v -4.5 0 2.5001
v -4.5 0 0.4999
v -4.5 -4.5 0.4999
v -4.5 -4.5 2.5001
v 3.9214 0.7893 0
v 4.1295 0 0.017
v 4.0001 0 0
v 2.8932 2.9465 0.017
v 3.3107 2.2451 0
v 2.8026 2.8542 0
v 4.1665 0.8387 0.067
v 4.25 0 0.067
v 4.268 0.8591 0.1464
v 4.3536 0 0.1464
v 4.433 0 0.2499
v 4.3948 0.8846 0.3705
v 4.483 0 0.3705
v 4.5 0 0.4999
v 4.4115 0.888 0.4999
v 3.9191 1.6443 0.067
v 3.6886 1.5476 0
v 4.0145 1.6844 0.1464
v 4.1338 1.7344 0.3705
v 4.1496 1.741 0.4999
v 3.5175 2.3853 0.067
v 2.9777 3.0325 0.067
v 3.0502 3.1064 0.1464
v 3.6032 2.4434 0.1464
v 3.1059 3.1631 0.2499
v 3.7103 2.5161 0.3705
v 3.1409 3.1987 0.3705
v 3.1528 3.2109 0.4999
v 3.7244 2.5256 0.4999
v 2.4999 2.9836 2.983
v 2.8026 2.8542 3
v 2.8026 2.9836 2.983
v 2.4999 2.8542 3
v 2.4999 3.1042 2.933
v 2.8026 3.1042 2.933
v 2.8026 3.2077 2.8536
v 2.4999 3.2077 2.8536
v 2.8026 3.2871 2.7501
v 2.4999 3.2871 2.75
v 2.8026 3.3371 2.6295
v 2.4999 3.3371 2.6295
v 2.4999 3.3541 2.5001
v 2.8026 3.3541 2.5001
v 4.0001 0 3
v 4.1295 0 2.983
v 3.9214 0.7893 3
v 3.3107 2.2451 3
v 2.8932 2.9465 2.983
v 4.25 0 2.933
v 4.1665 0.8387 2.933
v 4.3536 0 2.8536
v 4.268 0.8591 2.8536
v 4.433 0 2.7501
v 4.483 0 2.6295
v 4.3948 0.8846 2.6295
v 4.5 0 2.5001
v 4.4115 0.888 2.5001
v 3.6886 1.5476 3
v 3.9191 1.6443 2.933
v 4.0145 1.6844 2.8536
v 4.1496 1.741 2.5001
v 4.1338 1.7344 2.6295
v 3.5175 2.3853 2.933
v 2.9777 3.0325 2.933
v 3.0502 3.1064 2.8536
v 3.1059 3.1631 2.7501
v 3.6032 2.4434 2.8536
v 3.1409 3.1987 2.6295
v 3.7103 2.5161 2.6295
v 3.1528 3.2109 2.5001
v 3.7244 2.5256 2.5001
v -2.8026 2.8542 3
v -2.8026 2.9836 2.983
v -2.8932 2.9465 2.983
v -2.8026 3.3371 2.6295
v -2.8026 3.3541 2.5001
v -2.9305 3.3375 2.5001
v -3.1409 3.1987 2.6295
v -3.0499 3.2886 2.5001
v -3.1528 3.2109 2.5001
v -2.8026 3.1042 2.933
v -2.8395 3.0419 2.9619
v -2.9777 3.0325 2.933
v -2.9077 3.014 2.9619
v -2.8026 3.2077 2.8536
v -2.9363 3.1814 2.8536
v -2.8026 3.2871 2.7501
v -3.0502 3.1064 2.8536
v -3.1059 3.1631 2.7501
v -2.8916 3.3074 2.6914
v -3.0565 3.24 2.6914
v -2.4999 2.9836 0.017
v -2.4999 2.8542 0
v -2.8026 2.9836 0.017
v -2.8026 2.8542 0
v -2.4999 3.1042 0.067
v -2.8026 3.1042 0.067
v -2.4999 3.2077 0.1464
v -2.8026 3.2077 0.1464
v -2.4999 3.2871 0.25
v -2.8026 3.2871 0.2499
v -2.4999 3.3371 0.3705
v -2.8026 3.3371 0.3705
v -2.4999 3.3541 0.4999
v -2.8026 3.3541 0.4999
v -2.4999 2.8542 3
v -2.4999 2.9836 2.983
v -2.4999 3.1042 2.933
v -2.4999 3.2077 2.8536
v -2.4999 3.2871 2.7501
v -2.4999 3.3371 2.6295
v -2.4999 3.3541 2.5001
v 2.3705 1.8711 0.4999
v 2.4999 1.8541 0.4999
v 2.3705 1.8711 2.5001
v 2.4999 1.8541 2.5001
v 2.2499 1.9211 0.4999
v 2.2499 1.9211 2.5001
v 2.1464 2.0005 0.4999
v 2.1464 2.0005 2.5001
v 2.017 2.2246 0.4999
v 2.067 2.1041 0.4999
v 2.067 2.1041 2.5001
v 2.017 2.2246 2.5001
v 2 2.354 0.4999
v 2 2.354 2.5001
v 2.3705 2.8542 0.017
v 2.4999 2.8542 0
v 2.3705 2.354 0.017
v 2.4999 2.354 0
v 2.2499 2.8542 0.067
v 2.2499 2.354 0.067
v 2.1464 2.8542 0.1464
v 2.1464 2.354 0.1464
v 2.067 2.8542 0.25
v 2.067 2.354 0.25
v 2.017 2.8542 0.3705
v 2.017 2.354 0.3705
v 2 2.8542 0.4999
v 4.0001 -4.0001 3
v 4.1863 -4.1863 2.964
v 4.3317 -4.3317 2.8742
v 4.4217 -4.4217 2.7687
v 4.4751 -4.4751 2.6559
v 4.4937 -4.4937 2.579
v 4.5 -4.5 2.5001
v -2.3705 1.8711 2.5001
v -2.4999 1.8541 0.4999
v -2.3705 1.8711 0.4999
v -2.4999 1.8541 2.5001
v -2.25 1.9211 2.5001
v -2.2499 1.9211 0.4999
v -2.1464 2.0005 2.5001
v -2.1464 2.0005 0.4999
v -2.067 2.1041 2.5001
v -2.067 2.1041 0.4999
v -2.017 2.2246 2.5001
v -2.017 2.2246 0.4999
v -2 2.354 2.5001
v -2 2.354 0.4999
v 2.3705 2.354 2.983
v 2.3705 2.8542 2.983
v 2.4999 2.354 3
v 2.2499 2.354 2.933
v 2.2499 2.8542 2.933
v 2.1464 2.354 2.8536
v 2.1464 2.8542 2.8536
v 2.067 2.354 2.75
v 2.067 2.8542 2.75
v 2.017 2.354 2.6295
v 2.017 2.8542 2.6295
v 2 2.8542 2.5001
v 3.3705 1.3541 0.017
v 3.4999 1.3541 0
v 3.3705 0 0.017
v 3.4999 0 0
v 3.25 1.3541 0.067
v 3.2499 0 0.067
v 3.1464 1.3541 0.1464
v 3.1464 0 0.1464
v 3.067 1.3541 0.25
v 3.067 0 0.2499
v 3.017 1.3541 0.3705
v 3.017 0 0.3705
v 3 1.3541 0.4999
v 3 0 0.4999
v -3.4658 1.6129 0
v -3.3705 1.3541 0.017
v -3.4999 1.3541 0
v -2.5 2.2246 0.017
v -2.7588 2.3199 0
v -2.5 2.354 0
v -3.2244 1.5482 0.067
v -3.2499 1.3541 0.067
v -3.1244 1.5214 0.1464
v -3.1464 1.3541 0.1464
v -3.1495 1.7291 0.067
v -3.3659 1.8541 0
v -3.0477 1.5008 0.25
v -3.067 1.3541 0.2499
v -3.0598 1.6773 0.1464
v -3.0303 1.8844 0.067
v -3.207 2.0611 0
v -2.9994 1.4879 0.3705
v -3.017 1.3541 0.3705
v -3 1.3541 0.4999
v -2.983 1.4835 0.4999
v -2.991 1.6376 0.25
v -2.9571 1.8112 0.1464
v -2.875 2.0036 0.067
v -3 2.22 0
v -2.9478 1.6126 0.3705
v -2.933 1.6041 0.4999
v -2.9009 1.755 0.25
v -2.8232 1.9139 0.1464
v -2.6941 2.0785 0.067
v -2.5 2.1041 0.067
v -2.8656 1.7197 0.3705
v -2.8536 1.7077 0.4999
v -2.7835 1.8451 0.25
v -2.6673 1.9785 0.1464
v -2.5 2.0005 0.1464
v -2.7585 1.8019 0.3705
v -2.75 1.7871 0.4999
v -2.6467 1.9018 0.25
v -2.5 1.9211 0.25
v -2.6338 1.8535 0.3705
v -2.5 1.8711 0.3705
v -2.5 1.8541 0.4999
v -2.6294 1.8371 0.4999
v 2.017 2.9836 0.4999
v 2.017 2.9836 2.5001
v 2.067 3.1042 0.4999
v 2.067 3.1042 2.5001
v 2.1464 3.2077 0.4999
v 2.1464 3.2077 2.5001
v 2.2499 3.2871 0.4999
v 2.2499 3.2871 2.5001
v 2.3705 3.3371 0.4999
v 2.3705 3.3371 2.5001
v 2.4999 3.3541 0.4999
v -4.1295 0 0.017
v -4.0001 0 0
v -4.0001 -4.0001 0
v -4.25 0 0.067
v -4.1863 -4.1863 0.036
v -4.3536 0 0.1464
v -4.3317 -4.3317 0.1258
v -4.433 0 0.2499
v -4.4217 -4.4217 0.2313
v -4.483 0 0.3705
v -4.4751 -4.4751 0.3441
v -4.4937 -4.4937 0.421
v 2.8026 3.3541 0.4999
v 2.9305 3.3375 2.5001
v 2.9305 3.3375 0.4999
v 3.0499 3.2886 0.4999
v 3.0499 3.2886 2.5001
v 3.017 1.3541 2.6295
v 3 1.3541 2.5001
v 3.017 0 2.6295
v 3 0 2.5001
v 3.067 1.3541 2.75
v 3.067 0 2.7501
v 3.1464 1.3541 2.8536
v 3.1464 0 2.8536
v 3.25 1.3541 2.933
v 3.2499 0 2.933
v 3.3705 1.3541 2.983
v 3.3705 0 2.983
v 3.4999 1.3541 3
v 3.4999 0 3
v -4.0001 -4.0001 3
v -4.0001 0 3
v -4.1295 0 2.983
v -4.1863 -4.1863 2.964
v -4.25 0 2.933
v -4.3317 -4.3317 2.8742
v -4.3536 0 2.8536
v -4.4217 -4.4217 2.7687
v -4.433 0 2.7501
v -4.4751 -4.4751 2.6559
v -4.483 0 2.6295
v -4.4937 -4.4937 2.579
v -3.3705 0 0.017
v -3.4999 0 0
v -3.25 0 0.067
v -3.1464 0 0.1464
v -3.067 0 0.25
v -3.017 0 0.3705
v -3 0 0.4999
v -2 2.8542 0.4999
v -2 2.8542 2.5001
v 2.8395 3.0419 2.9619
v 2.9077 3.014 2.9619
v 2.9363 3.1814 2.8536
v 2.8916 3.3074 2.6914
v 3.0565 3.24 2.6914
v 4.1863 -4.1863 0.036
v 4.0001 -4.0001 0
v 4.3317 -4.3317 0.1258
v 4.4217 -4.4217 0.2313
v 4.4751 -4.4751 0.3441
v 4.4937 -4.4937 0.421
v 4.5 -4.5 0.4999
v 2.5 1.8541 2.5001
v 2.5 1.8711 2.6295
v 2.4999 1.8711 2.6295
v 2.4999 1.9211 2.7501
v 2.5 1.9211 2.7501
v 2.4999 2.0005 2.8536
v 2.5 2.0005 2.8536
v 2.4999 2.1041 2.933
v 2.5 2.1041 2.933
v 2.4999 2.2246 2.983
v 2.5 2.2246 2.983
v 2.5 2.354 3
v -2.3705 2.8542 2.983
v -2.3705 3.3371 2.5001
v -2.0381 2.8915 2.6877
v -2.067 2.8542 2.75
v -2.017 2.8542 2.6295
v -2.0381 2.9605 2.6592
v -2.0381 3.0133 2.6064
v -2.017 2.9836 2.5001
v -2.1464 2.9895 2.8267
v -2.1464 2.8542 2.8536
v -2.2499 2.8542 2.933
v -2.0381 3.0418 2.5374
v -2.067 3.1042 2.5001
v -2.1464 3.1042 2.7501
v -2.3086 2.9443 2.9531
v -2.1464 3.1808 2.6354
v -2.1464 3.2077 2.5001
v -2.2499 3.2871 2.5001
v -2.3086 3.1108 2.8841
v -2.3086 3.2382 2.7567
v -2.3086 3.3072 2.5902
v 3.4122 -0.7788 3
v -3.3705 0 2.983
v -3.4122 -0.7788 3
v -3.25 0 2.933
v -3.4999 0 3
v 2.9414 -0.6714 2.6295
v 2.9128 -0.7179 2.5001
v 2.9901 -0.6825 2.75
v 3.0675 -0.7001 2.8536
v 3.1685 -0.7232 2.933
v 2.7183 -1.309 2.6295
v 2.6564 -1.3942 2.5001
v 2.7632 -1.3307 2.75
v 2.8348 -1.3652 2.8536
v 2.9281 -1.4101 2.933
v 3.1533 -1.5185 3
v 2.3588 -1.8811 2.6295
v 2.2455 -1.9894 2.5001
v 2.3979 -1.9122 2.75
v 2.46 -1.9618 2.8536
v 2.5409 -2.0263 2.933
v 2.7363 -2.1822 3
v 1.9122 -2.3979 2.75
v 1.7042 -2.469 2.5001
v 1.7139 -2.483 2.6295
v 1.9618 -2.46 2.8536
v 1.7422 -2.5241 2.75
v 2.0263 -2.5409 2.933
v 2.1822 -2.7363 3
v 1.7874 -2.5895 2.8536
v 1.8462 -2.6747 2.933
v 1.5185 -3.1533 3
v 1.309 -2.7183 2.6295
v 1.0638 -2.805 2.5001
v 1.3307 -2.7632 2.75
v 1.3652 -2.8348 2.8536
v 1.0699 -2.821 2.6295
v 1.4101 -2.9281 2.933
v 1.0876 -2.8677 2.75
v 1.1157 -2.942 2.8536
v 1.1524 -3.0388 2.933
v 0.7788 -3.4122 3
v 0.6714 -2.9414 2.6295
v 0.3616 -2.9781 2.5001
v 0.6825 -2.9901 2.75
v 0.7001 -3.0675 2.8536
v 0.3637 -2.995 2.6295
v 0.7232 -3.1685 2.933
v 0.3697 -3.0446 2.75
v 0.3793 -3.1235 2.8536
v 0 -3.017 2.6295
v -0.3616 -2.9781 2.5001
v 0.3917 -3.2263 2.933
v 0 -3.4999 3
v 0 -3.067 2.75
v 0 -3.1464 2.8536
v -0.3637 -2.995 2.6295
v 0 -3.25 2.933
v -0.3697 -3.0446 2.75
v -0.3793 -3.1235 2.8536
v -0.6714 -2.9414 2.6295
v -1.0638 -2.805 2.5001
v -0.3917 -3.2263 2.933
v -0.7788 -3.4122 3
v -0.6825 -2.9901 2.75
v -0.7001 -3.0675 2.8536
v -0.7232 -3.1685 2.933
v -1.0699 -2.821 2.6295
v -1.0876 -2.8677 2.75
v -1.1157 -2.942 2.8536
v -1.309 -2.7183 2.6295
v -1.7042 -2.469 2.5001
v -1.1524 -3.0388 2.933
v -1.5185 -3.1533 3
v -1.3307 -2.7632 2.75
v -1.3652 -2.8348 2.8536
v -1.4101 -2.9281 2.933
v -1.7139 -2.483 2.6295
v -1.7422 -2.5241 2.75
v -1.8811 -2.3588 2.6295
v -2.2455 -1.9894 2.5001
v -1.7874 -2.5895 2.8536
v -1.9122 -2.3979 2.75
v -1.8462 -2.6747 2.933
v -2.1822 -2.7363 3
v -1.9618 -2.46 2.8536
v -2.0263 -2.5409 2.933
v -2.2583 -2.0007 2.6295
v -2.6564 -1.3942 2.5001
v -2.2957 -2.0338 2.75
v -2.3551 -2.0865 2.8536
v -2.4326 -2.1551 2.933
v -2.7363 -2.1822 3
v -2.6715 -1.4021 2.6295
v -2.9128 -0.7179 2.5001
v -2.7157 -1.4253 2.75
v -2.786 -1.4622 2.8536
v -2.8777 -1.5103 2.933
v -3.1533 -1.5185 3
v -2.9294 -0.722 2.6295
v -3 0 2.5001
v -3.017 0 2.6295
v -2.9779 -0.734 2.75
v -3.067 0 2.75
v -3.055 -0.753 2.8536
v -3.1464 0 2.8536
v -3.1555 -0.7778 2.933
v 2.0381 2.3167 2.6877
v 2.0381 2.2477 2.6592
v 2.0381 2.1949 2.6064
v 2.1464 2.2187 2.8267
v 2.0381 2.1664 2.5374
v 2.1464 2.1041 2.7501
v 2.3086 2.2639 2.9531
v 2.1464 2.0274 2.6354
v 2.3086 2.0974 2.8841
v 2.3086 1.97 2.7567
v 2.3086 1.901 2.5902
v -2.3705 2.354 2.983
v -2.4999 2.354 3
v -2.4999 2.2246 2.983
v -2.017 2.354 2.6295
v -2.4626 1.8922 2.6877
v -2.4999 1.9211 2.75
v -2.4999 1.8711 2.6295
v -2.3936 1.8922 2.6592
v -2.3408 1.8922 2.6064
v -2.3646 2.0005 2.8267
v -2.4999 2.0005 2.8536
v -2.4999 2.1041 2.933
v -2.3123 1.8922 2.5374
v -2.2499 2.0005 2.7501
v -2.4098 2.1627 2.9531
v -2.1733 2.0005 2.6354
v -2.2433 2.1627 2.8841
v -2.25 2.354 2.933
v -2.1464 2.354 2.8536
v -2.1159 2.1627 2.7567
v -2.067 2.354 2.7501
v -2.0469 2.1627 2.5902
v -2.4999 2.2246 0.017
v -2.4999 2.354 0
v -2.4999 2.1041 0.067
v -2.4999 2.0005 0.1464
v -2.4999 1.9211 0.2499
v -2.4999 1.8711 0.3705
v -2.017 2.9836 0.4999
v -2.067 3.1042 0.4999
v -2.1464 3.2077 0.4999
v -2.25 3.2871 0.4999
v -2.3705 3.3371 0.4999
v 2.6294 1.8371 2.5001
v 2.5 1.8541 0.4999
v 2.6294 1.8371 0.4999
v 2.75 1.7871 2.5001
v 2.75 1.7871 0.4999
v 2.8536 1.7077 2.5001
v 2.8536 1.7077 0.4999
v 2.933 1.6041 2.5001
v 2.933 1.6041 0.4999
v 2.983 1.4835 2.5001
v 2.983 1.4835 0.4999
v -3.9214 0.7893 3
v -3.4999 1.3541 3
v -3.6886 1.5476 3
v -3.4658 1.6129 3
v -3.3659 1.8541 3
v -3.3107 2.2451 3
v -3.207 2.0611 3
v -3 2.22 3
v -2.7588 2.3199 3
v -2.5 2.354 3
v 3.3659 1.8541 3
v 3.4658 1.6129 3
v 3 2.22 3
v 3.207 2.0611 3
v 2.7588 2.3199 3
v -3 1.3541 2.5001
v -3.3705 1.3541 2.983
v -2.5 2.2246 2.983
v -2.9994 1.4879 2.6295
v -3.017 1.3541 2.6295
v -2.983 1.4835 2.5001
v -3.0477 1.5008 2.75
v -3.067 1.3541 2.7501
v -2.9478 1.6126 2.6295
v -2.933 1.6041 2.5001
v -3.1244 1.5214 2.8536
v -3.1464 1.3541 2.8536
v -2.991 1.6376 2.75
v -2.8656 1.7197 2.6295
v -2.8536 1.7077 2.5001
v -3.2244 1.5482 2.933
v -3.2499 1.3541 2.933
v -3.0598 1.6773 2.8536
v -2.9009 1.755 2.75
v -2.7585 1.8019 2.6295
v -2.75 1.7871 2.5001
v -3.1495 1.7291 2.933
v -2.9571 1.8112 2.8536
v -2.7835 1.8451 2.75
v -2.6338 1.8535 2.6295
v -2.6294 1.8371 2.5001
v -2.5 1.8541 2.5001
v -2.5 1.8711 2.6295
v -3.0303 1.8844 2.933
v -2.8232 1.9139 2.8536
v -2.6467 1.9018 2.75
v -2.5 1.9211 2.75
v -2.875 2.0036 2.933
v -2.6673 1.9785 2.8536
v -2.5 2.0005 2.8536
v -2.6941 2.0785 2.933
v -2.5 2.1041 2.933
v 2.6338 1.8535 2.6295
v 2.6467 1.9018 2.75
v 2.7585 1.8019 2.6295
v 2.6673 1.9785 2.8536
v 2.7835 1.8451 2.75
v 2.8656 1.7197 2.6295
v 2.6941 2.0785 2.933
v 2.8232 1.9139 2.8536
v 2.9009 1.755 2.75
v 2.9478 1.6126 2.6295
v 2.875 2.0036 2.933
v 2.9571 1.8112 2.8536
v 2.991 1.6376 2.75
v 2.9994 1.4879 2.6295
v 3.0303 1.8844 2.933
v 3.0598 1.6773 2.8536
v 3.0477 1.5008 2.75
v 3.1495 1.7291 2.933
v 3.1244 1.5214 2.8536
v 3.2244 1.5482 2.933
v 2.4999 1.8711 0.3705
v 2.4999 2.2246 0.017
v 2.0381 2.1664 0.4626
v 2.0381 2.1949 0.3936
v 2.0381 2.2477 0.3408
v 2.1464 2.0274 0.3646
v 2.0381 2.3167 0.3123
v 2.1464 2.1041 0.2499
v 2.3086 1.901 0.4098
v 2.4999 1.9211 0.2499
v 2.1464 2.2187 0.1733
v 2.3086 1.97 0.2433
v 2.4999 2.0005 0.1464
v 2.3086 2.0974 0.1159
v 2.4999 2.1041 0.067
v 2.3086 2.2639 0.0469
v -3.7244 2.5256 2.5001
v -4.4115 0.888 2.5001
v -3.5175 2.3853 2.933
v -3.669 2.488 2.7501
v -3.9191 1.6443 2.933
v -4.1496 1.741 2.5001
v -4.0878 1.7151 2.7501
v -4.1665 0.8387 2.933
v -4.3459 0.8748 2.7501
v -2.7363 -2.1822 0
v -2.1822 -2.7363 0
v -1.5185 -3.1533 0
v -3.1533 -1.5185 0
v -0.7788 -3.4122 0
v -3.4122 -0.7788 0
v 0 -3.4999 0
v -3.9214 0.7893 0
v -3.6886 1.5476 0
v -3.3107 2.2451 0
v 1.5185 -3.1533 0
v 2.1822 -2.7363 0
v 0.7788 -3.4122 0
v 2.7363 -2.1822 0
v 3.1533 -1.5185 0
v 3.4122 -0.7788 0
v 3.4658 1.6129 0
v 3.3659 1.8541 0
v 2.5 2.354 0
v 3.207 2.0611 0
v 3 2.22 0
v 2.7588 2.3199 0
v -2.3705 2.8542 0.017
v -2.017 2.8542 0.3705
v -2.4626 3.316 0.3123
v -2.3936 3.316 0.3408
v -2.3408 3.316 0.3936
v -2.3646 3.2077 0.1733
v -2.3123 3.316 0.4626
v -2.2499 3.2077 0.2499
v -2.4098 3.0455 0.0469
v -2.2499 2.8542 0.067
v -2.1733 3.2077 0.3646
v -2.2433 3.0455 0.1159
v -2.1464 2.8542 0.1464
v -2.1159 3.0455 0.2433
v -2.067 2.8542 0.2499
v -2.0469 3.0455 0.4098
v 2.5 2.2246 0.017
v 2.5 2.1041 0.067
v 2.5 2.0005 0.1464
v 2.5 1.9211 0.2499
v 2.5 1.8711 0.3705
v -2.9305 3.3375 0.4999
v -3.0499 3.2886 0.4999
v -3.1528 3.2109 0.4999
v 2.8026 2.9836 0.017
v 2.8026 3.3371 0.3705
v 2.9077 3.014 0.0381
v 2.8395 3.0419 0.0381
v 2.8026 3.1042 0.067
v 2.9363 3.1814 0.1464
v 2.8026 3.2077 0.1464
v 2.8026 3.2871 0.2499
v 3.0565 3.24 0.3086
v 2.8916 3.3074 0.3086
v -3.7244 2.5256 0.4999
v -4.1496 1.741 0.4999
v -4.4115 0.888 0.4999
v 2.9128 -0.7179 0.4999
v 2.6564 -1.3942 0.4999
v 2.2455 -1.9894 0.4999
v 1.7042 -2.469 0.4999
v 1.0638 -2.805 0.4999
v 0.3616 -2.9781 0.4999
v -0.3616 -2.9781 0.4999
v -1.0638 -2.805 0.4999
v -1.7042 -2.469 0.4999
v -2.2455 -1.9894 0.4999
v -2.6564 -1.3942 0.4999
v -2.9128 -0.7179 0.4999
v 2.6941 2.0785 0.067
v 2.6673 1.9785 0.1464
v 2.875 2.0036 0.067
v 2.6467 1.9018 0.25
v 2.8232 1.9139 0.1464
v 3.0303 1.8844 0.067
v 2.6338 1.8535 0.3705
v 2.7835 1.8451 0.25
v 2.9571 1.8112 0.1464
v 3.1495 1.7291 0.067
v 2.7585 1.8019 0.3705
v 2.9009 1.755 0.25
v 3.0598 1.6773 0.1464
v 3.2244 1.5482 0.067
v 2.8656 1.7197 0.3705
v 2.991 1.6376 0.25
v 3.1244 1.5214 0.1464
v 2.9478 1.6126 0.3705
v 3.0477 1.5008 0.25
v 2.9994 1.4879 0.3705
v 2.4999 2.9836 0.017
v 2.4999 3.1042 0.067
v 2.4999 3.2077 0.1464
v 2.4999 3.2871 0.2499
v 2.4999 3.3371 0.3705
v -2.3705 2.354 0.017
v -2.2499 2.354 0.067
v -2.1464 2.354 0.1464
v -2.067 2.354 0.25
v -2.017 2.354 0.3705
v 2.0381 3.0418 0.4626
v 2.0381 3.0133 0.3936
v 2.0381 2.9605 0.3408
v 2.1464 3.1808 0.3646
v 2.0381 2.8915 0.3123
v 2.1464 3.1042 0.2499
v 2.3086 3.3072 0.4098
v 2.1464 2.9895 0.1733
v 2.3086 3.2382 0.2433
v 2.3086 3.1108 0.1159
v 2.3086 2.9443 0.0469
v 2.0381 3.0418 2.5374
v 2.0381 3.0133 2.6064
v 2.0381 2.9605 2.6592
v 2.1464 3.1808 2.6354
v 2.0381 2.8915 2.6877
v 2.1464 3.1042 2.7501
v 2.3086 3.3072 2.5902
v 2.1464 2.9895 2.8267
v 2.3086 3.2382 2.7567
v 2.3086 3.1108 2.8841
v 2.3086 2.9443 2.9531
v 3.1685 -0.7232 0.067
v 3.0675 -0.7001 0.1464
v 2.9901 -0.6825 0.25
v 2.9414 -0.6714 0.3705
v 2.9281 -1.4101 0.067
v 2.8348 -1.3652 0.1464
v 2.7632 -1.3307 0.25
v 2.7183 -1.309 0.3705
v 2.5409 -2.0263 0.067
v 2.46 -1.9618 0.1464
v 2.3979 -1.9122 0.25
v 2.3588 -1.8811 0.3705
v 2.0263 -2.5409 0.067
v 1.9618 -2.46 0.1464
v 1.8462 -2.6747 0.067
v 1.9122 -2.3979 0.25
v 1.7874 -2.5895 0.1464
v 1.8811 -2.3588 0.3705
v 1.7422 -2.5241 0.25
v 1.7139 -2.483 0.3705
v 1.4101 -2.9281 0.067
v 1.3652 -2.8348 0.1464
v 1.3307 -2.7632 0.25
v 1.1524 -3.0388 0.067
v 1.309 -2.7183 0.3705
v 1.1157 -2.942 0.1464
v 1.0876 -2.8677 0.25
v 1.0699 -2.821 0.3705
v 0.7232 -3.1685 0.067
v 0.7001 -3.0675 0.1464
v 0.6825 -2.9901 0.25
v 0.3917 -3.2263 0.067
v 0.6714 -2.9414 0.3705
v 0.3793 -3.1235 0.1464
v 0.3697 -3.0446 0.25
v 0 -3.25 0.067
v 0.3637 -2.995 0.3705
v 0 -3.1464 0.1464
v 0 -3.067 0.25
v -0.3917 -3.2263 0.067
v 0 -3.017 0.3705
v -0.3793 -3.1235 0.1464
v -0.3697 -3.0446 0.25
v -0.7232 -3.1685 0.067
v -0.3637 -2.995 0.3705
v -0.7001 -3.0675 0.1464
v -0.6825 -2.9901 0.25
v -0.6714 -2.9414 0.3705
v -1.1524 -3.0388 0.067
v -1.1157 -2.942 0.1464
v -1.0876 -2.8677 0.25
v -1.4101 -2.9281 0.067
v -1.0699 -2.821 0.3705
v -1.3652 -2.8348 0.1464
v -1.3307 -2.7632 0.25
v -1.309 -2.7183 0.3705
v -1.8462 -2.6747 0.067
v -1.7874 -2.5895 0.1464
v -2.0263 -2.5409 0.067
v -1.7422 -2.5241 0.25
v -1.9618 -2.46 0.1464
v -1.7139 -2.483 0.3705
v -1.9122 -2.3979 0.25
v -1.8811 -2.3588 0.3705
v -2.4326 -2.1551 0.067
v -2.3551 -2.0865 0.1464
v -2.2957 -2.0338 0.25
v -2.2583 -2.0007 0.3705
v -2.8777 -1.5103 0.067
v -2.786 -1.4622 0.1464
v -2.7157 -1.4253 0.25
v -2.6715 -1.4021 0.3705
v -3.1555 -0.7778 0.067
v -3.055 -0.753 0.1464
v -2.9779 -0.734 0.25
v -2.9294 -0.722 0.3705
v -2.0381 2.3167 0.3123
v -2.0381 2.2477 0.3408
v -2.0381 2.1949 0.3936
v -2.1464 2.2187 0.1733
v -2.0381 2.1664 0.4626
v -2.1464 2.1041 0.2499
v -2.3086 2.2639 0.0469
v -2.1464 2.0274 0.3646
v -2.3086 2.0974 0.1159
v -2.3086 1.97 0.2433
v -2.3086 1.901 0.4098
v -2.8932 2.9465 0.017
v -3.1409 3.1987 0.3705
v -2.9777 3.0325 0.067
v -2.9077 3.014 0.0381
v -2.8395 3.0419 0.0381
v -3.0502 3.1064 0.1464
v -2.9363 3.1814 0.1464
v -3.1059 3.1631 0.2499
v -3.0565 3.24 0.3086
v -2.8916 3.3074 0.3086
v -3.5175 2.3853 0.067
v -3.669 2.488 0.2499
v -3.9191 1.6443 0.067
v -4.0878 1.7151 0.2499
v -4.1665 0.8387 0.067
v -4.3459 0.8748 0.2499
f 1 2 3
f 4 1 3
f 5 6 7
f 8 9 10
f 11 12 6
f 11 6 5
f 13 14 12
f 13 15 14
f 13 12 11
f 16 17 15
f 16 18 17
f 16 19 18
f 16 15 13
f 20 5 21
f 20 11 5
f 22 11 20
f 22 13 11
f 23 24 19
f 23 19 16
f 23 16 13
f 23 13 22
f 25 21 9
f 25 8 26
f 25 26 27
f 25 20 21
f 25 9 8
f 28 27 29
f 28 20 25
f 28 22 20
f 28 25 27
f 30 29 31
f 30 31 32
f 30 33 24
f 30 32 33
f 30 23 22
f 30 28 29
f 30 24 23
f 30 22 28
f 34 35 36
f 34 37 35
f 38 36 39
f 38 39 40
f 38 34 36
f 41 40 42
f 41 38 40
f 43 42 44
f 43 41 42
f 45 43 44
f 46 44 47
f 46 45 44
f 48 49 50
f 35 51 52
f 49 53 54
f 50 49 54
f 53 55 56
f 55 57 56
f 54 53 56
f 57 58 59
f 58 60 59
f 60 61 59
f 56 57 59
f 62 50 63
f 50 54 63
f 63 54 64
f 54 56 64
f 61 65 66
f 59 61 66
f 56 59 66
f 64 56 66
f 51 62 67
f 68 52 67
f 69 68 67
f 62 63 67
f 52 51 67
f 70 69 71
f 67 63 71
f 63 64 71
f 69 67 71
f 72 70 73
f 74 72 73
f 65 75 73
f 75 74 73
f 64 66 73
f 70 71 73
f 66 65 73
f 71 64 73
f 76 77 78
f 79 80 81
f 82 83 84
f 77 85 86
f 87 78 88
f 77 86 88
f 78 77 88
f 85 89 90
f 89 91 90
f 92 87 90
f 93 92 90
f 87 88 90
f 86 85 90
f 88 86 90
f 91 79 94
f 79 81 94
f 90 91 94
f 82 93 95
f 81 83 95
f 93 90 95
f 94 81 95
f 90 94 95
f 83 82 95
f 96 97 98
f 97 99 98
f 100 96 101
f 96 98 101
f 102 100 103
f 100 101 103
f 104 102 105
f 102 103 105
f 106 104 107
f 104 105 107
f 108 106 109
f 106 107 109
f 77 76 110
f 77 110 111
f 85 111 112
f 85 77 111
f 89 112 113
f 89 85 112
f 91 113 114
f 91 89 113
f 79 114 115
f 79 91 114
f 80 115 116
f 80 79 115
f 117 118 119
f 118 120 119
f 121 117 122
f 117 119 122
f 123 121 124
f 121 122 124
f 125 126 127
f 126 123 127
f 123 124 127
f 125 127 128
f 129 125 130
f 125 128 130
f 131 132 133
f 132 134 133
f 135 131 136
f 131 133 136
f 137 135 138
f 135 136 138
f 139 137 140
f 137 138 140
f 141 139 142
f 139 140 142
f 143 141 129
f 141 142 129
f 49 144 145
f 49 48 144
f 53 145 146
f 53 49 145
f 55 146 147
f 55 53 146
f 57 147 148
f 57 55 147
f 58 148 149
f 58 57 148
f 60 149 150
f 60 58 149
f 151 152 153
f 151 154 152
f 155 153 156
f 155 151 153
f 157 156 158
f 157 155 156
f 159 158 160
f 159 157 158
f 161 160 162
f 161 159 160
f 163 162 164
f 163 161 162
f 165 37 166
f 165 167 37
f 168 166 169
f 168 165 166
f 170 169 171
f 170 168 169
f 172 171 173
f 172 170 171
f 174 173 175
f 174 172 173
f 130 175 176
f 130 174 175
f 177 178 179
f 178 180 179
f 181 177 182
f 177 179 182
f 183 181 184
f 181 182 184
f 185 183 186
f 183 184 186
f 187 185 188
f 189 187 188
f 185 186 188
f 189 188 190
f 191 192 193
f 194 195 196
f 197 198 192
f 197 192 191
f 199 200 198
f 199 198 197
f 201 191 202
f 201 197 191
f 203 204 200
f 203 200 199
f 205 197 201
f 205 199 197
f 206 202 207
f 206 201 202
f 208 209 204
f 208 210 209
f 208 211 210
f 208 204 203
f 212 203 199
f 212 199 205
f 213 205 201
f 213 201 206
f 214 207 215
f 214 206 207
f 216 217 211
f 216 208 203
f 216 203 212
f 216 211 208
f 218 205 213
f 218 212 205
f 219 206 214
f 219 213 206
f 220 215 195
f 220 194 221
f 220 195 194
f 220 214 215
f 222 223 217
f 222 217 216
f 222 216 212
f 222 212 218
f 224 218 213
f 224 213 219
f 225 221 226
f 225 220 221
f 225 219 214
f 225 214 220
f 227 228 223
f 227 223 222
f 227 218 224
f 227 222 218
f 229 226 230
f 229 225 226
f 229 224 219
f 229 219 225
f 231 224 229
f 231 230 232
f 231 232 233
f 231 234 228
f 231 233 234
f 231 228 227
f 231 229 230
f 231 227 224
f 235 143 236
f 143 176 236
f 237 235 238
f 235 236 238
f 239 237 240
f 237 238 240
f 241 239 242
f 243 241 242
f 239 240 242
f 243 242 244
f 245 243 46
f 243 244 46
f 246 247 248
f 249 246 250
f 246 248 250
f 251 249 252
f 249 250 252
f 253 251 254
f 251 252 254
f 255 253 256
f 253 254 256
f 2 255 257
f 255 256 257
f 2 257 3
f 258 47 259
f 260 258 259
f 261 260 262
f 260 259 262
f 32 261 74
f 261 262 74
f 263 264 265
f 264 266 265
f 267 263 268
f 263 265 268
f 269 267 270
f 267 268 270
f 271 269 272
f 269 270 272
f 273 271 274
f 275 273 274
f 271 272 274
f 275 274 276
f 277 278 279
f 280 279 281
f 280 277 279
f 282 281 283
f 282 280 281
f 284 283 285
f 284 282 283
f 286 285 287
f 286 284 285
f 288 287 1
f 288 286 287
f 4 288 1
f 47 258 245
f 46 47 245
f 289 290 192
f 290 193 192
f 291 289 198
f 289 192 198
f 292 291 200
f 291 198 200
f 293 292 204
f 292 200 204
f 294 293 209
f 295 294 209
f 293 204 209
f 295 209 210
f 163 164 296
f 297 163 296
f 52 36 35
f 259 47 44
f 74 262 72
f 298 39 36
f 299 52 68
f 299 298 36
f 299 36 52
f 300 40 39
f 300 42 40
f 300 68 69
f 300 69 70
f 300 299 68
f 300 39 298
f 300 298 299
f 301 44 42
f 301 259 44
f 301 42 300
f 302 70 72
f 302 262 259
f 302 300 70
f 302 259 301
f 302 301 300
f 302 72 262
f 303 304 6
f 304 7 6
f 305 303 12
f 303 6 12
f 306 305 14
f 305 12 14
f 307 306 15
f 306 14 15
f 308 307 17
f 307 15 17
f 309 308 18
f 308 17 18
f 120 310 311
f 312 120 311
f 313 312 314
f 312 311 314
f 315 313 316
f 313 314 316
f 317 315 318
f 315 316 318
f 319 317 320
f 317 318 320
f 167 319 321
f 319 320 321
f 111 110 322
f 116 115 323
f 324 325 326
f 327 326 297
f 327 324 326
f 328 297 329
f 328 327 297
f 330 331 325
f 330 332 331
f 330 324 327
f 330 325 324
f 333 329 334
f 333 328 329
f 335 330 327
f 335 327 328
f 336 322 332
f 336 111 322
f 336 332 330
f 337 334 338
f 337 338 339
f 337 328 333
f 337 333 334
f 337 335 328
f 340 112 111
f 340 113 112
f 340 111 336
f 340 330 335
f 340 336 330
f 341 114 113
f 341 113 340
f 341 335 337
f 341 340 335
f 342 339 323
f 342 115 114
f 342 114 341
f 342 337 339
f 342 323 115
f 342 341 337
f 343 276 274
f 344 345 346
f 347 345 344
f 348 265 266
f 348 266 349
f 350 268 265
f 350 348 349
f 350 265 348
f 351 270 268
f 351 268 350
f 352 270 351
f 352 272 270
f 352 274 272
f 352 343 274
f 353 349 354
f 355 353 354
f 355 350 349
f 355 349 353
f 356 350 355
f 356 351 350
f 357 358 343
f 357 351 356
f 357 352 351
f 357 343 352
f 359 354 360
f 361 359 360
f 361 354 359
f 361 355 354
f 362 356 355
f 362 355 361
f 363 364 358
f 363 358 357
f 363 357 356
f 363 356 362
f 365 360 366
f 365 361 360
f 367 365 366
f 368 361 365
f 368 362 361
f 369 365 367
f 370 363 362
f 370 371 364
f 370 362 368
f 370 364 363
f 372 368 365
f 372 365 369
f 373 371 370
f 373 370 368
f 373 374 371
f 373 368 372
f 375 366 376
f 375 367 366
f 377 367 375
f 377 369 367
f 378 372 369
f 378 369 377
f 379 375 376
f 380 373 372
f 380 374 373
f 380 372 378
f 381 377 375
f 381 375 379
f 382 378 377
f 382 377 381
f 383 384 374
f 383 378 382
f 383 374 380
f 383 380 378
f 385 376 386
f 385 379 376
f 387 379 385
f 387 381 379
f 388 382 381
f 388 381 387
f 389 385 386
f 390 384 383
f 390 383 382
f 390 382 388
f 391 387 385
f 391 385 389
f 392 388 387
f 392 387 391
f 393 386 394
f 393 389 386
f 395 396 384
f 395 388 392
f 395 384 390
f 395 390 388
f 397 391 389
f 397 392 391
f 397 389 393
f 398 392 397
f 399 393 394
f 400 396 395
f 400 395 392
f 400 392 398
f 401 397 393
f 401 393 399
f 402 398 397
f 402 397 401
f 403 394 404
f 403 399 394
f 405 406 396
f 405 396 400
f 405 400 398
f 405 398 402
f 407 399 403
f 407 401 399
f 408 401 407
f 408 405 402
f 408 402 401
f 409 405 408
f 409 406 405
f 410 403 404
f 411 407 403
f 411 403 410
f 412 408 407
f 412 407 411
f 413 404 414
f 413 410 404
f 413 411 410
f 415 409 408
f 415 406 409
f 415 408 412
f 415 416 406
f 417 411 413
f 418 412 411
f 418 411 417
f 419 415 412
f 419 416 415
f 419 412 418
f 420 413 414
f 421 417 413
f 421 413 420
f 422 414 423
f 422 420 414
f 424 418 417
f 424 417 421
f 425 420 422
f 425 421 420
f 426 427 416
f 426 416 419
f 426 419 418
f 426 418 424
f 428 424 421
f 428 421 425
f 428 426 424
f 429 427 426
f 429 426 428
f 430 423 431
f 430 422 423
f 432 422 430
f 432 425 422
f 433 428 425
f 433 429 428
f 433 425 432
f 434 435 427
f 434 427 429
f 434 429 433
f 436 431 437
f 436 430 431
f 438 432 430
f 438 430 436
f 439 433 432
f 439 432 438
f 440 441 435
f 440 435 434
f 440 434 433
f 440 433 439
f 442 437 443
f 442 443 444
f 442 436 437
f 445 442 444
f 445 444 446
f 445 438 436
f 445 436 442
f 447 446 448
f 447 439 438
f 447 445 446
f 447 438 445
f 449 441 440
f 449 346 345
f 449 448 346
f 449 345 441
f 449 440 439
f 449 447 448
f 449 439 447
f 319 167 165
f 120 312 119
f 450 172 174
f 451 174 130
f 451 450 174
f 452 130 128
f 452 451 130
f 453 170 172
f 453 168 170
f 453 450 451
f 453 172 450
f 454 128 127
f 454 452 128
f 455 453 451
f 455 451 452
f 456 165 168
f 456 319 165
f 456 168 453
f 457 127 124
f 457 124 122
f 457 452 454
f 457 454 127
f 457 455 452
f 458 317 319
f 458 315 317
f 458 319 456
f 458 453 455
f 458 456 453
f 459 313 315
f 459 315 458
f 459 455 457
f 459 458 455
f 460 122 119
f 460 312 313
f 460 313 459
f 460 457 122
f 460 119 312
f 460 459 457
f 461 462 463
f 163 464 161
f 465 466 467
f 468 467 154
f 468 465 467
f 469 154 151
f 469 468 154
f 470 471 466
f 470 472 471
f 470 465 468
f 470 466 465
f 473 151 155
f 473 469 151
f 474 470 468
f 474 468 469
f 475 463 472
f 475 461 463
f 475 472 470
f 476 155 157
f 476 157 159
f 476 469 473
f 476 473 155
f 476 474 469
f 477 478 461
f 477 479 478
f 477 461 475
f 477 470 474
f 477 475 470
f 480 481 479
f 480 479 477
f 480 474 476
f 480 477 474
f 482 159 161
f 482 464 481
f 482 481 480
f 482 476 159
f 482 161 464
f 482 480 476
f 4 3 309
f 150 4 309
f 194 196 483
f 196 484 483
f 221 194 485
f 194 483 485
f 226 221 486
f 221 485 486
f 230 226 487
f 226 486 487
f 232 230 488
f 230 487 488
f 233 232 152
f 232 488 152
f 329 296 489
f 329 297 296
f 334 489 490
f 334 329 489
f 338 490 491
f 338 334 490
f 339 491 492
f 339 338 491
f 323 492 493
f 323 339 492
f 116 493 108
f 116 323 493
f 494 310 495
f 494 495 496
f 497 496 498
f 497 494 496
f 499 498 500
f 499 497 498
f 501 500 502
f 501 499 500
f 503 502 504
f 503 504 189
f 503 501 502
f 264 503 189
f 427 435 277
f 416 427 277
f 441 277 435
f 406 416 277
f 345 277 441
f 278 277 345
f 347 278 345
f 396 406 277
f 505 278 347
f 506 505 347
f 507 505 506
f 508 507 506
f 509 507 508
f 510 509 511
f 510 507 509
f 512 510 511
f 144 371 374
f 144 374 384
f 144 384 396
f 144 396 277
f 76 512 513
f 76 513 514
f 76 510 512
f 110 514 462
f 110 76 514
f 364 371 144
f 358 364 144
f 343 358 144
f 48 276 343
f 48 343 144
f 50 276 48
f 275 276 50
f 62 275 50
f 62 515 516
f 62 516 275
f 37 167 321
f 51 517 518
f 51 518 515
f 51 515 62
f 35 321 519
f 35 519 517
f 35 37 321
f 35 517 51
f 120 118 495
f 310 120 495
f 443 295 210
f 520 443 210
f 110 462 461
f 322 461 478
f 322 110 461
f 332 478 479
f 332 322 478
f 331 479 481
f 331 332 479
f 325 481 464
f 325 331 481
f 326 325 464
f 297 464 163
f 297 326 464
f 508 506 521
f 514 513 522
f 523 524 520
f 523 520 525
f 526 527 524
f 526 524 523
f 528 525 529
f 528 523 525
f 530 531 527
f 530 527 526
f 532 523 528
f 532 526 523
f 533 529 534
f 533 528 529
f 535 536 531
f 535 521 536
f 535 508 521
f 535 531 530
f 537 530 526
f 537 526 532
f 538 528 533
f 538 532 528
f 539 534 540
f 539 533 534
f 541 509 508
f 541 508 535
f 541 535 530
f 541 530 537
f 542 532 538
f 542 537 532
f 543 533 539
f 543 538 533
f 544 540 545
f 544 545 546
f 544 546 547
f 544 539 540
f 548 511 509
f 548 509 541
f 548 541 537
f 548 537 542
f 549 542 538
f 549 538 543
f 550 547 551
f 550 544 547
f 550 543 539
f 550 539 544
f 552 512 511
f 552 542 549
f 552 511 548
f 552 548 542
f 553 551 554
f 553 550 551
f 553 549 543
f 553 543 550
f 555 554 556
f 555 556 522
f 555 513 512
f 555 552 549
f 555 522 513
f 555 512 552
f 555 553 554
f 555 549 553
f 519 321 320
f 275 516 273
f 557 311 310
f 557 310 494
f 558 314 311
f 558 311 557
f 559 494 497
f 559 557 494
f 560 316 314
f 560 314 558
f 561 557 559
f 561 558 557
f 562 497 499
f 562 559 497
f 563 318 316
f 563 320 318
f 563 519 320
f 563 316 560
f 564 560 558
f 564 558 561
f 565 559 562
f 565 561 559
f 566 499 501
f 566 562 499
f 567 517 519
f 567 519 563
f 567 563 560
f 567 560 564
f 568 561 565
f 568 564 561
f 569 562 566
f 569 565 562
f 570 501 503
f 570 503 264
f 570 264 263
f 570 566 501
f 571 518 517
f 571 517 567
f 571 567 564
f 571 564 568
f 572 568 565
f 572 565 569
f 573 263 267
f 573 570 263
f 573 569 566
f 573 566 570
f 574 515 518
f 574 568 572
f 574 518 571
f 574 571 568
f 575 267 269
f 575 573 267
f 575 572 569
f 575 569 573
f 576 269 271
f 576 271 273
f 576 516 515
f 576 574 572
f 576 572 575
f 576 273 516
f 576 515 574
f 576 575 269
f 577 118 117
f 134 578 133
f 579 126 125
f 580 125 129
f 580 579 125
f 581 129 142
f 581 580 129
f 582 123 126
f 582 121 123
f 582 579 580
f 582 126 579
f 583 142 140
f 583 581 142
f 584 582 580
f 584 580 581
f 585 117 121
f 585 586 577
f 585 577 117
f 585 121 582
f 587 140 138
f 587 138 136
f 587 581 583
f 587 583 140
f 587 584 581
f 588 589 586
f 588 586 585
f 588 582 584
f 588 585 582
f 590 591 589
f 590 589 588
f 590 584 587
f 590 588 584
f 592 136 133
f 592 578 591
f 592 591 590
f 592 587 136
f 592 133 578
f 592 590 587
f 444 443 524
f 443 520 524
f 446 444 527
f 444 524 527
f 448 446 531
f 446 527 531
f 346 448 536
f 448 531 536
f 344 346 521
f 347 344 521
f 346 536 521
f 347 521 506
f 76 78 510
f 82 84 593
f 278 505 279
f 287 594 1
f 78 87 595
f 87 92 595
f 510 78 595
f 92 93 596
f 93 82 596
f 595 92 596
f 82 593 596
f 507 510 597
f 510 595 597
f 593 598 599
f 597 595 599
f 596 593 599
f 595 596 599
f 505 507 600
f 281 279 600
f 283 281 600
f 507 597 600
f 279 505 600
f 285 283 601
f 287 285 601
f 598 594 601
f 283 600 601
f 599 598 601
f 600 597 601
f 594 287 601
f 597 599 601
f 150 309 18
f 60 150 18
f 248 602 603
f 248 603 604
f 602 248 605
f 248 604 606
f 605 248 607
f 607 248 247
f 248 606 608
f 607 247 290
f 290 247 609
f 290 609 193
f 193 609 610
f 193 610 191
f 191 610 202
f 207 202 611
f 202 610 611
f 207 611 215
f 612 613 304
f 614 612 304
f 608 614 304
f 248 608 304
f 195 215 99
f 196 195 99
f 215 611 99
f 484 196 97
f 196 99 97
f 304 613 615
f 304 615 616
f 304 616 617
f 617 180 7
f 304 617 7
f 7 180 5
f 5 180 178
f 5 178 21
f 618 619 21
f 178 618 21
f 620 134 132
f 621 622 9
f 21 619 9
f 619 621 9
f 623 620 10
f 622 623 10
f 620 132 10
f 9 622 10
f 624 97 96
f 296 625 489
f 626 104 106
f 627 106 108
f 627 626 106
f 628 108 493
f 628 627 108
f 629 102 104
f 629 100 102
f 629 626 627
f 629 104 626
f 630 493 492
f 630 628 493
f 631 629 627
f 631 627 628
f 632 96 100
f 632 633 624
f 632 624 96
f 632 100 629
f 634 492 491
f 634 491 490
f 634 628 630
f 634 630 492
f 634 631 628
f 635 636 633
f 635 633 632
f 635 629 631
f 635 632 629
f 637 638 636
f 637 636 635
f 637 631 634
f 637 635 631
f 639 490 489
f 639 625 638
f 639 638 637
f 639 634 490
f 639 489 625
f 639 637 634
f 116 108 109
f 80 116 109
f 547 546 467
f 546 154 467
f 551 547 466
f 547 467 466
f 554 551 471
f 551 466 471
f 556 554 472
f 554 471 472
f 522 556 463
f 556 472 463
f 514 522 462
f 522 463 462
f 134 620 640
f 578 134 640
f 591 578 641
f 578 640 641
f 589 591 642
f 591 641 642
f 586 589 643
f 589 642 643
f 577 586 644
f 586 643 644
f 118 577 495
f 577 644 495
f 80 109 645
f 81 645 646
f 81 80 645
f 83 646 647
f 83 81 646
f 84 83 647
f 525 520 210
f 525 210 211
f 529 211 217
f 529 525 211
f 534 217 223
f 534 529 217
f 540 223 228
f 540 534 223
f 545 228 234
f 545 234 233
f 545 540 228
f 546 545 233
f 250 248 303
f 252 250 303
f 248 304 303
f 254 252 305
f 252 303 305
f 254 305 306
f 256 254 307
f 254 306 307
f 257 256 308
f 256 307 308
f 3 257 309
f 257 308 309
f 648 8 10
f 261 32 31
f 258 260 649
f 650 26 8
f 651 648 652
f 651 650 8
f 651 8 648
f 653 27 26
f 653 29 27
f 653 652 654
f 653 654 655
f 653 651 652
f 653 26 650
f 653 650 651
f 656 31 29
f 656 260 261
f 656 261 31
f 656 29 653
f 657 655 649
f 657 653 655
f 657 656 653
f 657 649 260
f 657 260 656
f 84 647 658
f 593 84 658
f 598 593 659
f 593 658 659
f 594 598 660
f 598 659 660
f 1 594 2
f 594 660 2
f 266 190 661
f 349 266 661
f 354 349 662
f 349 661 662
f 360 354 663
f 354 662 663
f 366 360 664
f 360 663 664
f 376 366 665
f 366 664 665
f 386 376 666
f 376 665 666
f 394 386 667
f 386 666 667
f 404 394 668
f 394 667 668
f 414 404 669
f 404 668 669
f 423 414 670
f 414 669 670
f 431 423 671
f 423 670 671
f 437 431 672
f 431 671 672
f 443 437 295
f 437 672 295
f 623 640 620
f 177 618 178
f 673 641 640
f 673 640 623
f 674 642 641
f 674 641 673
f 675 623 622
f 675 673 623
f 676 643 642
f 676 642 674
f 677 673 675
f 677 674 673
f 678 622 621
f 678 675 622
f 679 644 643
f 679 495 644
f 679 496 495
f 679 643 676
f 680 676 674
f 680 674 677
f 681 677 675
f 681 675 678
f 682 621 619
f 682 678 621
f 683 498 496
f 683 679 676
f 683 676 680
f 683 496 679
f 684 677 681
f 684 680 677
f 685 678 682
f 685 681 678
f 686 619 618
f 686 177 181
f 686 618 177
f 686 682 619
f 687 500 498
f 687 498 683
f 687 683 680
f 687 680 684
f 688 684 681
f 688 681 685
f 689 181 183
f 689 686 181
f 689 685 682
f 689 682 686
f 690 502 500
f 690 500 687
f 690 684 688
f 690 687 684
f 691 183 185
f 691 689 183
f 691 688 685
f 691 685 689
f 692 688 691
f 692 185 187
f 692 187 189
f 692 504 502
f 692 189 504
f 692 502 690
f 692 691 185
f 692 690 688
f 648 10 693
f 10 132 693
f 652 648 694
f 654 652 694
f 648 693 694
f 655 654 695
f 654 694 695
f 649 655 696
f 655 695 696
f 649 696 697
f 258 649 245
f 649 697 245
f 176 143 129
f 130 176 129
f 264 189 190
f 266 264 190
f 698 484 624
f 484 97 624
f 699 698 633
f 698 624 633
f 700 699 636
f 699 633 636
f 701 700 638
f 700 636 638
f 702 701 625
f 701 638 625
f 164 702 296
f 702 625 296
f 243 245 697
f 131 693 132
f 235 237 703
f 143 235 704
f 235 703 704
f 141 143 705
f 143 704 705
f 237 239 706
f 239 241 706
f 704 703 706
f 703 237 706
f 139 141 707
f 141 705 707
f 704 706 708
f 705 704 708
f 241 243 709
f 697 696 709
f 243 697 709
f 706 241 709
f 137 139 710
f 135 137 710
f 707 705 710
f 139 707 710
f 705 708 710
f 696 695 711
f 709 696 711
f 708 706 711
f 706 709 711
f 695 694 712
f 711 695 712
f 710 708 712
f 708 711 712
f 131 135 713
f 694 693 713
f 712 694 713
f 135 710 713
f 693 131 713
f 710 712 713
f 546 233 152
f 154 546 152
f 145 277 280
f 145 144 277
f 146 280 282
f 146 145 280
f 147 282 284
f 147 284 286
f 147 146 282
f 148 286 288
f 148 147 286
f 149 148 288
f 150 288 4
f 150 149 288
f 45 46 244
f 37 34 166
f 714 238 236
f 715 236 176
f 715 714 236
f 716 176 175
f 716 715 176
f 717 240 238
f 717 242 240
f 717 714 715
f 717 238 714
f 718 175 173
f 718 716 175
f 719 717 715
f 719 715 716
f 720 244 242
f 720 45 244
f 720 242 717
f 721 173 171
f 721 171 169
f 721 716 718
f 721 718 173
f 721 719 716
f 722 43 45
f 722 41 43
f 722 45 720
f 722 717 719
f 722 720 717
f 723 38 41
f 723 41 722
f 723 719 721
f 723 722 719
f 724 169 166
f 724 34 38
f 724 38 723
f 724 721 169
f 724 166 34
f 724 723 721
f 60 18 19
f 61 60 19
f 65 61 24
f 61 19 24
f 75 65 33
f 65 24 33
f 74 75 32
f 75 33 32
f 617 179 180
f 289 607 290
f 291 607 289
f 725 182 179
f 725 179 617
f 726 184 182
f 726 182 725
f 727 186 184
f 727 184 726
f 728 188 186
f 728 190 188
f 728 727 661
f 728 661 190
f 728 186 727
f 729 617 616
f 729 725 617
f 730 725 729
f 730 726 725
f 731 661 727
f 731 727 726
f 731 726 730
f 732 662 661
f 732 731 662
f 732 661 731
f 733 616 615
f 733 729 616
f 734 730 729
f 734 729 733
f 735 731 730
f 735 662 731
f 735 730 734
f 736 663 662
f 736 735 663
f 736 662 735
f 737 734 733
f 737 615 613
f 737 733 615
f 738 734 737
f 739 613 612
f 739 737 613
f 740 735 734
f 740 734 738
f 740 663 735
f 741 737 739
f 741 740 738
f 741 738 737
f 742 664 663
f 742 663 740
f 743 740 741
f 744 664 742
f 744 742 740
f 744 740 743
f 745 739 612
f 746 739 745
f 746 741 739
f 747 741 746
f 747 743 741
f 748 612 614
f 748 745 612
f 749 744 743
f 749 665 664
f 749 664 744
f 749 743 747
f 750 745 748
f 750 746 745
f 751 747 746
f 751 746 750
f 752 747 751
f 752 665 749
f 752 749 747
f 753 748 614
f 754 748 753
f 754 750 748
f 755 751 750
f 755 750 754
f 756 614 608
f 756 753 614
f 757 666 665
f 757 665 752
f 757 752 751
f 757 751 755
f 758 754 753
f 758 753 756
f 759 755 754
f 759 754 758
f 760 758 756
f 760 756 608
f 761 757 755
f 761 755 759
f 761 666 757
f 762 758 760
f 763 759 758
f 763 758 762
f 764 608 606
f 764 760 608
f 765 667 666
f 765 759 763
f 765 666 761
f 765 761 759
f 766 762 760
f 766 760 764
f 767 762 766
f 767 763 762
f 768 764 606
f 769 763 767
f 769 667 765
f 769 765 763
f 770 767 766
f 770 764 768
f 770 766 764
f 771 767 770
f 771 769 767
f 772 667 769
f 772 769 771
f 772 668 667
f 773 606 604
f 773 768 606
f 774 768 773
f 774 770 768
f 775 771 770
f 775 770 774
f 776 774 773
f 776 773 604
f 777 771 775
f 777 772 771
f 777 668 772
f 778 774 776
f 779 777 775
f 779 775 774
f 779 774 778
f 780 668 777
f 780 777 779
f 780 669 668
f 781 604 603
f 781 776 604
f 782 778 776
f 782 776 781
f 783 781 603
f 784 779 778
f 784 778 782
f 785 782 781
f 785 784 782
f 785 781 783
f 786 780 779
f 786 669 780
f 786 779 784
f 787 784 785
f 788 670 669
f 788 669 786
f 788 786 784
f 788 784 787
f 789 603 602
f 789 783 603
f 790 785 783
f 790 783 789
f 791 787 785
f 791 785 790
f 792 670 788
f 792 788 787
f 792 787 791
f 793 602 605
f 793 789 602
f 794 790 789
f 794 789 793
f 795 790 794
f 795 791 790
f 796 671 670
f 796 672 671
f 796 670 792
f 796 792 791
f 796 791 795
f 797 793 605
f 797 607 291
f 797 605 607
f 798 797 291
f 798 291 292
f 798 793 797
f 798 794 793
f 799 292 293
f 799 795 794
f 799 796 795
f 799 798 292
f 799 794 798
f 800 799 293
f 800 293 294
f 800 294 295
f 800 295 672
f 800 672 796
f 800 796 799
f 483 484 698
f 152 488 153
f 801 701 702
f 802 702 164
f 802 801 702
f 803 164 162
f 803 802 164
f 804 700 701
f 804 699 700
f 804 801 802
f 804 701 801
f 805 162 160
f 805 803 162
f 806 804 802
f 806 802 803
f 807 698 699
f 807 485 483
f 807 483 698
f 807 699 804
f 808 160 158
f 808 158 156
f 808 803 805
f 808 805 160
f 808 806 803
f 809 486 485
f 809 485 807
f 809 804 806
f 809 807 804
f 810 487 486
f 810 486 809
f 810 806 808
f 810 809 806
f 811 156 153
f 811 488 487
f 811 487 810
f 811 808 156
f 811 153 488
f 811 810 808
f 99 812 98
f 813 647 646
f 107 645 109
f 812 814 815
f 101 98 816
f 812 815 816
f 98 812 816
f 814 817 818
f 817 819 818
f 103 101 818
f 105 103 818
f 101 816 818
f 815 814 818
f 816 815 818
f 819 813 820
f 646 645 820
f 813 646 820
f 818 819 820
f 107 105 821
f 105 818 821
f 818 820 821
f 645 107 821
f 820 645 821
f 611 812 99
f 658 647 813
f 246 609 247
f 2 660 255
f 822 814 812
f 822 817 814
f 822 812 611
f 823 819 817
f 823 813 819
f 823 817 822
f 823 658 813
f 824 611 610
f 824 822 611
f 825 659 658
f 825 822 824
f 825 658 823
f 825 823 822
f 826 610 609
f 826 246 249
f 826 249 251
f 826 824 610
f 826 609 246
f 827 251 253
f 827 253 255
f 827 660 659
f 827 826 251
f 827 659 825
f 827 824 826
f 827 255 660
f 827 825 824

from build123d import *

# Parameters (mm, degrees)
EXTRUDE_1_DEPTH = 3
FILLET_1_R      = 0.5


with BuildPart() as part:
    # Эскиз1 → Бобышка-Вытянуть1 (new body)
    with BuildSketch(Plane.XY):
        with BuildLine():
            Line((-3, 0), (-3, 1.854101966))
            Line((-3, 1.854101966), (-2, 1.854101966))
            Line((-2, 1.854101966), (-2, 3.354101966))
            Line((-2, 3.354101966), (-3, 3.354101966))
            ThreePointArc((-3, 3.354101966), (-4.107919181, 1.837117307), (-4.5, 0))
            Line((-4.5, 0), (-4.5, -4.5))
            Line((-4.5, -4.5), (4.5, -4.5))
            Line((4.5, -4.5), (4.5, 0))
            ThreePointArc((4.5, 0), (4.107919181, 1.837117307), (3, 3.354101966))
            Line((3, 3.354101966), (2, 3.354101966))
            Line((2, 3.354101966), (2, 1.854101966))
            Line((2, 1.854101966), (3, 1.854101966))
            Line((3, 1.854101966), (3, 0))
            ThreePointArc((3, 0), (0, -3), (-3, 0))
        make_face()
    extrude(amount=EXTRUDE_1_DEPTH)

    # Скругление1
    fillet_1_edges = [part.edges().sort_by_distance(p)[0] for p in [
        (3, 1.854101966, 1.5),
        (-3, 1.854101966, 1.5),
    ]]
    fillet(fillet_1_edges, radius=FILLET_1_R)
    fillet_1_2_edges = [part.edges().sort_by_distance(p)[0] for p in [
        (3, 3.354101966, 1.5),
        (-4.5, -2.25, 0),
        (0, -4.5, 0),
        (4.5, -2.25, 0),
        (4.107919181, 1.837117307, 0),
        (2.5, 3.354101966, 0),
        (0, -3, 0),
        (-3, 0.677050983, 0),
        (-2, 2.604101966, 0),
        (-2.5, 3.354101966, 0),
        (-4.107919181, 1.837117307, 0),
        (3, 0.677050983, 0),
        (-2.5, 3.354101966, 3),
        (-2, 2.604101966, 3),
        (-3, 0.677050983, 3),
        (0, -3, 3),
        (3, 0.677050983, 3),
        (2.5, 3.354101966, 3),
        (4.107919181, 1.837117307, 3),
        (4.5, -2.25, 3),
        (0, -4.5, 3),
        (-4.5, -2.25, 3),
        (-4.107919181, 1.837117307, 3),
        (2, 3.354101966, 1.5),
        (2, 2.604101966, 3),
        (2, 1.854101966, 1.5),
        (2, 2.604101966, 0),
        (-3, 3.354101966, 1.5),
        (-2, 3.354101966, 1.5),
        (-2, 1.854101966, 1.5),
        (2.853553391, 1.707655357, 3),
        (-2.853553391, 1.707655357, 3),
        (2.853553391, 1.707655357, 0),
        (-2.853553391, 1.707655357, 0),
    ]]
    fillet(fillet_1_2_edges, radius=FILLET_1_R - 0.0001)  # a hair under: the kernel refuses the full size


solid = part.part
